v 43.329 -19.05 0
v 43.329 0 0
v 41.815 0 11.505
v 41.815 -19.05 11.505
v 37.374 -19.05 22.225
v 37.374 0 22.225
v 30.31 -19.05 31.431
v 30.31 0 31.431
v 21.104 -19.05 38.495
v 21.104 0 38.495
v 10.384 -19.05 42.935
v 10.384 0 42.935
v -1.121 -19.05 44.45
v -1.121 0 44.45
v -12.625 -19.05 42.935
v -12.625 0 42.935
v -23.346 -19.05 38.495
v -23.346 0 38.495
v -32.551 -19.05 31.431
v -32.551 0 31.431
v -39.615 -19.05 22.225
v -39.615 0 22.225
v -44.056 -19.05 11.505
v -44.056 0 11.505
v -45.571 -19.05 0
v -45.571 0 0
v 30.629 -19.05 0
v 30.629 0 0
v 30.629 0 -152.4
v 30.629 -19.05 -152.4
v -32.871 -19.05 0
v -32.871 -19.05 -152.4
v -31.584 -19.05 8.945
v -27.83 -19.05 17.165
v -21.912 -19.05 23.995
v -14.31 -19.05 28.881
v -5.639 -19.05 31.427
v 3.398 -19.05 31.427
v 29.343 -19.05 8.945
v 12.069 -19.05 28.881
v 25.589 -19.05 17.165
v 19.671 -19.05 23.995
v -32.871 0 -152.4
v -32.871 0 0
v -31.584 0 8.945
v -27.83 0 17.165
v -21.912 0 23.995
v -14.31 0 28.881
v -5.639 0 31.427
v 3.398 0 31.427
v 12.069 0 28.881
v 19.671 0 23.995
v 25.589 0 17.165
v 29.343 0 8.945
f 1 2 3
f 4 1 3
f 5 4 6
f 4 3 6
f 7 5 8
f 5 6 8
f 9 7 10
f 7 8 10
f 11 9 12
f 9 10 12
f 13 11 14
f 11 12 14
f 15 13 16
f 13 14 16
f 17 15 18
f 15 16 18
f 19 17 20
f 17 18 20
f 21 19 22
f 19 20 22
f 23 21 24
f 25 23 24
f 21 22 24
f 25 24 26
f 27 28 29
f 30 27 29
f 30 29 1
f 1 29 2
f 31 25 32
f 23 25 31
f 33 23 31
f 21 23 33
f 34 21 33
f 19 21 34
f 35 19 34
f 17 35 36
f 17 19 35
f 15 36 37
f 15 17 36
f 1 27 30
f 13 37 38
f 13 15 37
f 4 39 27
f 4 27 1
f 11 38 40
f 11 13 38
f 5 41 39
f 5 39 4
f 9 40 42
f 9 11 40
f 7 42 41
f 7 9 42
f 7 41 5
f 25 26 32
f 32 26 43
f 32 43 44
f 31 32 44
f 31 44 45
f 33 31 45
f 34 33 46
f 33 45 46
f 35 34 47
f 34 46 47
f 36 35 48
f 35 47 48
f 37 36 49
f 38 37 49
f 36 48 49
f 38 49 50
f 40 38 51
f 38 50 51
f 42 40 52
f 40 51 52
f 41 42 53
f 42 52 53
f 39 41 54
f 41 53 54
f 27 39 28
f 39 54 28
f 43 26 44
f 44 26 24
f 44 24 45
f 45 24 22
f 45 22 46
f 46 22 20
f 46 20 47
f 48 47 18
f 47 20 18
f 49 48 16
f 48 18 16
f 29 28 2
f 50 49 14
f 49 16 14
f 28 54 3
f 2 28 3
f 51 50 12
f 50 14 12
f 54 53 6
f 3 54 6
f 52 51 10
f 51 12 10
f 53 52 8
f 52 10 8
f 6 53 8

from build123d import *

# Parameters (mm, degrees)
F1_DEPTH = 19.05


with BuildPart() as f1:
    # F0 (on Front) → F1 (new body)
    with BuildSketch(Plane.XZ):
        with BuildLine():
            ThreePointArc((-32.870578, 0), (-1.120578, 31.75), (30.629422, 0))
            Line((30.629422, 0), (30.629422, -152.4))
            Line((30.629422, -152.4), (43.329422, 0))
            ThreePointArc((43.329422, 0), (-1.120578, 44.45), (-45.570578, 0))
            Line((-45.570578, 0), (-32.870578, -152.4))
            Line((-32.870578, -152.4), (-32.870578, 0))
        make_face()
    extrude(amount=F1_DEPTH)


solid = f1.part
